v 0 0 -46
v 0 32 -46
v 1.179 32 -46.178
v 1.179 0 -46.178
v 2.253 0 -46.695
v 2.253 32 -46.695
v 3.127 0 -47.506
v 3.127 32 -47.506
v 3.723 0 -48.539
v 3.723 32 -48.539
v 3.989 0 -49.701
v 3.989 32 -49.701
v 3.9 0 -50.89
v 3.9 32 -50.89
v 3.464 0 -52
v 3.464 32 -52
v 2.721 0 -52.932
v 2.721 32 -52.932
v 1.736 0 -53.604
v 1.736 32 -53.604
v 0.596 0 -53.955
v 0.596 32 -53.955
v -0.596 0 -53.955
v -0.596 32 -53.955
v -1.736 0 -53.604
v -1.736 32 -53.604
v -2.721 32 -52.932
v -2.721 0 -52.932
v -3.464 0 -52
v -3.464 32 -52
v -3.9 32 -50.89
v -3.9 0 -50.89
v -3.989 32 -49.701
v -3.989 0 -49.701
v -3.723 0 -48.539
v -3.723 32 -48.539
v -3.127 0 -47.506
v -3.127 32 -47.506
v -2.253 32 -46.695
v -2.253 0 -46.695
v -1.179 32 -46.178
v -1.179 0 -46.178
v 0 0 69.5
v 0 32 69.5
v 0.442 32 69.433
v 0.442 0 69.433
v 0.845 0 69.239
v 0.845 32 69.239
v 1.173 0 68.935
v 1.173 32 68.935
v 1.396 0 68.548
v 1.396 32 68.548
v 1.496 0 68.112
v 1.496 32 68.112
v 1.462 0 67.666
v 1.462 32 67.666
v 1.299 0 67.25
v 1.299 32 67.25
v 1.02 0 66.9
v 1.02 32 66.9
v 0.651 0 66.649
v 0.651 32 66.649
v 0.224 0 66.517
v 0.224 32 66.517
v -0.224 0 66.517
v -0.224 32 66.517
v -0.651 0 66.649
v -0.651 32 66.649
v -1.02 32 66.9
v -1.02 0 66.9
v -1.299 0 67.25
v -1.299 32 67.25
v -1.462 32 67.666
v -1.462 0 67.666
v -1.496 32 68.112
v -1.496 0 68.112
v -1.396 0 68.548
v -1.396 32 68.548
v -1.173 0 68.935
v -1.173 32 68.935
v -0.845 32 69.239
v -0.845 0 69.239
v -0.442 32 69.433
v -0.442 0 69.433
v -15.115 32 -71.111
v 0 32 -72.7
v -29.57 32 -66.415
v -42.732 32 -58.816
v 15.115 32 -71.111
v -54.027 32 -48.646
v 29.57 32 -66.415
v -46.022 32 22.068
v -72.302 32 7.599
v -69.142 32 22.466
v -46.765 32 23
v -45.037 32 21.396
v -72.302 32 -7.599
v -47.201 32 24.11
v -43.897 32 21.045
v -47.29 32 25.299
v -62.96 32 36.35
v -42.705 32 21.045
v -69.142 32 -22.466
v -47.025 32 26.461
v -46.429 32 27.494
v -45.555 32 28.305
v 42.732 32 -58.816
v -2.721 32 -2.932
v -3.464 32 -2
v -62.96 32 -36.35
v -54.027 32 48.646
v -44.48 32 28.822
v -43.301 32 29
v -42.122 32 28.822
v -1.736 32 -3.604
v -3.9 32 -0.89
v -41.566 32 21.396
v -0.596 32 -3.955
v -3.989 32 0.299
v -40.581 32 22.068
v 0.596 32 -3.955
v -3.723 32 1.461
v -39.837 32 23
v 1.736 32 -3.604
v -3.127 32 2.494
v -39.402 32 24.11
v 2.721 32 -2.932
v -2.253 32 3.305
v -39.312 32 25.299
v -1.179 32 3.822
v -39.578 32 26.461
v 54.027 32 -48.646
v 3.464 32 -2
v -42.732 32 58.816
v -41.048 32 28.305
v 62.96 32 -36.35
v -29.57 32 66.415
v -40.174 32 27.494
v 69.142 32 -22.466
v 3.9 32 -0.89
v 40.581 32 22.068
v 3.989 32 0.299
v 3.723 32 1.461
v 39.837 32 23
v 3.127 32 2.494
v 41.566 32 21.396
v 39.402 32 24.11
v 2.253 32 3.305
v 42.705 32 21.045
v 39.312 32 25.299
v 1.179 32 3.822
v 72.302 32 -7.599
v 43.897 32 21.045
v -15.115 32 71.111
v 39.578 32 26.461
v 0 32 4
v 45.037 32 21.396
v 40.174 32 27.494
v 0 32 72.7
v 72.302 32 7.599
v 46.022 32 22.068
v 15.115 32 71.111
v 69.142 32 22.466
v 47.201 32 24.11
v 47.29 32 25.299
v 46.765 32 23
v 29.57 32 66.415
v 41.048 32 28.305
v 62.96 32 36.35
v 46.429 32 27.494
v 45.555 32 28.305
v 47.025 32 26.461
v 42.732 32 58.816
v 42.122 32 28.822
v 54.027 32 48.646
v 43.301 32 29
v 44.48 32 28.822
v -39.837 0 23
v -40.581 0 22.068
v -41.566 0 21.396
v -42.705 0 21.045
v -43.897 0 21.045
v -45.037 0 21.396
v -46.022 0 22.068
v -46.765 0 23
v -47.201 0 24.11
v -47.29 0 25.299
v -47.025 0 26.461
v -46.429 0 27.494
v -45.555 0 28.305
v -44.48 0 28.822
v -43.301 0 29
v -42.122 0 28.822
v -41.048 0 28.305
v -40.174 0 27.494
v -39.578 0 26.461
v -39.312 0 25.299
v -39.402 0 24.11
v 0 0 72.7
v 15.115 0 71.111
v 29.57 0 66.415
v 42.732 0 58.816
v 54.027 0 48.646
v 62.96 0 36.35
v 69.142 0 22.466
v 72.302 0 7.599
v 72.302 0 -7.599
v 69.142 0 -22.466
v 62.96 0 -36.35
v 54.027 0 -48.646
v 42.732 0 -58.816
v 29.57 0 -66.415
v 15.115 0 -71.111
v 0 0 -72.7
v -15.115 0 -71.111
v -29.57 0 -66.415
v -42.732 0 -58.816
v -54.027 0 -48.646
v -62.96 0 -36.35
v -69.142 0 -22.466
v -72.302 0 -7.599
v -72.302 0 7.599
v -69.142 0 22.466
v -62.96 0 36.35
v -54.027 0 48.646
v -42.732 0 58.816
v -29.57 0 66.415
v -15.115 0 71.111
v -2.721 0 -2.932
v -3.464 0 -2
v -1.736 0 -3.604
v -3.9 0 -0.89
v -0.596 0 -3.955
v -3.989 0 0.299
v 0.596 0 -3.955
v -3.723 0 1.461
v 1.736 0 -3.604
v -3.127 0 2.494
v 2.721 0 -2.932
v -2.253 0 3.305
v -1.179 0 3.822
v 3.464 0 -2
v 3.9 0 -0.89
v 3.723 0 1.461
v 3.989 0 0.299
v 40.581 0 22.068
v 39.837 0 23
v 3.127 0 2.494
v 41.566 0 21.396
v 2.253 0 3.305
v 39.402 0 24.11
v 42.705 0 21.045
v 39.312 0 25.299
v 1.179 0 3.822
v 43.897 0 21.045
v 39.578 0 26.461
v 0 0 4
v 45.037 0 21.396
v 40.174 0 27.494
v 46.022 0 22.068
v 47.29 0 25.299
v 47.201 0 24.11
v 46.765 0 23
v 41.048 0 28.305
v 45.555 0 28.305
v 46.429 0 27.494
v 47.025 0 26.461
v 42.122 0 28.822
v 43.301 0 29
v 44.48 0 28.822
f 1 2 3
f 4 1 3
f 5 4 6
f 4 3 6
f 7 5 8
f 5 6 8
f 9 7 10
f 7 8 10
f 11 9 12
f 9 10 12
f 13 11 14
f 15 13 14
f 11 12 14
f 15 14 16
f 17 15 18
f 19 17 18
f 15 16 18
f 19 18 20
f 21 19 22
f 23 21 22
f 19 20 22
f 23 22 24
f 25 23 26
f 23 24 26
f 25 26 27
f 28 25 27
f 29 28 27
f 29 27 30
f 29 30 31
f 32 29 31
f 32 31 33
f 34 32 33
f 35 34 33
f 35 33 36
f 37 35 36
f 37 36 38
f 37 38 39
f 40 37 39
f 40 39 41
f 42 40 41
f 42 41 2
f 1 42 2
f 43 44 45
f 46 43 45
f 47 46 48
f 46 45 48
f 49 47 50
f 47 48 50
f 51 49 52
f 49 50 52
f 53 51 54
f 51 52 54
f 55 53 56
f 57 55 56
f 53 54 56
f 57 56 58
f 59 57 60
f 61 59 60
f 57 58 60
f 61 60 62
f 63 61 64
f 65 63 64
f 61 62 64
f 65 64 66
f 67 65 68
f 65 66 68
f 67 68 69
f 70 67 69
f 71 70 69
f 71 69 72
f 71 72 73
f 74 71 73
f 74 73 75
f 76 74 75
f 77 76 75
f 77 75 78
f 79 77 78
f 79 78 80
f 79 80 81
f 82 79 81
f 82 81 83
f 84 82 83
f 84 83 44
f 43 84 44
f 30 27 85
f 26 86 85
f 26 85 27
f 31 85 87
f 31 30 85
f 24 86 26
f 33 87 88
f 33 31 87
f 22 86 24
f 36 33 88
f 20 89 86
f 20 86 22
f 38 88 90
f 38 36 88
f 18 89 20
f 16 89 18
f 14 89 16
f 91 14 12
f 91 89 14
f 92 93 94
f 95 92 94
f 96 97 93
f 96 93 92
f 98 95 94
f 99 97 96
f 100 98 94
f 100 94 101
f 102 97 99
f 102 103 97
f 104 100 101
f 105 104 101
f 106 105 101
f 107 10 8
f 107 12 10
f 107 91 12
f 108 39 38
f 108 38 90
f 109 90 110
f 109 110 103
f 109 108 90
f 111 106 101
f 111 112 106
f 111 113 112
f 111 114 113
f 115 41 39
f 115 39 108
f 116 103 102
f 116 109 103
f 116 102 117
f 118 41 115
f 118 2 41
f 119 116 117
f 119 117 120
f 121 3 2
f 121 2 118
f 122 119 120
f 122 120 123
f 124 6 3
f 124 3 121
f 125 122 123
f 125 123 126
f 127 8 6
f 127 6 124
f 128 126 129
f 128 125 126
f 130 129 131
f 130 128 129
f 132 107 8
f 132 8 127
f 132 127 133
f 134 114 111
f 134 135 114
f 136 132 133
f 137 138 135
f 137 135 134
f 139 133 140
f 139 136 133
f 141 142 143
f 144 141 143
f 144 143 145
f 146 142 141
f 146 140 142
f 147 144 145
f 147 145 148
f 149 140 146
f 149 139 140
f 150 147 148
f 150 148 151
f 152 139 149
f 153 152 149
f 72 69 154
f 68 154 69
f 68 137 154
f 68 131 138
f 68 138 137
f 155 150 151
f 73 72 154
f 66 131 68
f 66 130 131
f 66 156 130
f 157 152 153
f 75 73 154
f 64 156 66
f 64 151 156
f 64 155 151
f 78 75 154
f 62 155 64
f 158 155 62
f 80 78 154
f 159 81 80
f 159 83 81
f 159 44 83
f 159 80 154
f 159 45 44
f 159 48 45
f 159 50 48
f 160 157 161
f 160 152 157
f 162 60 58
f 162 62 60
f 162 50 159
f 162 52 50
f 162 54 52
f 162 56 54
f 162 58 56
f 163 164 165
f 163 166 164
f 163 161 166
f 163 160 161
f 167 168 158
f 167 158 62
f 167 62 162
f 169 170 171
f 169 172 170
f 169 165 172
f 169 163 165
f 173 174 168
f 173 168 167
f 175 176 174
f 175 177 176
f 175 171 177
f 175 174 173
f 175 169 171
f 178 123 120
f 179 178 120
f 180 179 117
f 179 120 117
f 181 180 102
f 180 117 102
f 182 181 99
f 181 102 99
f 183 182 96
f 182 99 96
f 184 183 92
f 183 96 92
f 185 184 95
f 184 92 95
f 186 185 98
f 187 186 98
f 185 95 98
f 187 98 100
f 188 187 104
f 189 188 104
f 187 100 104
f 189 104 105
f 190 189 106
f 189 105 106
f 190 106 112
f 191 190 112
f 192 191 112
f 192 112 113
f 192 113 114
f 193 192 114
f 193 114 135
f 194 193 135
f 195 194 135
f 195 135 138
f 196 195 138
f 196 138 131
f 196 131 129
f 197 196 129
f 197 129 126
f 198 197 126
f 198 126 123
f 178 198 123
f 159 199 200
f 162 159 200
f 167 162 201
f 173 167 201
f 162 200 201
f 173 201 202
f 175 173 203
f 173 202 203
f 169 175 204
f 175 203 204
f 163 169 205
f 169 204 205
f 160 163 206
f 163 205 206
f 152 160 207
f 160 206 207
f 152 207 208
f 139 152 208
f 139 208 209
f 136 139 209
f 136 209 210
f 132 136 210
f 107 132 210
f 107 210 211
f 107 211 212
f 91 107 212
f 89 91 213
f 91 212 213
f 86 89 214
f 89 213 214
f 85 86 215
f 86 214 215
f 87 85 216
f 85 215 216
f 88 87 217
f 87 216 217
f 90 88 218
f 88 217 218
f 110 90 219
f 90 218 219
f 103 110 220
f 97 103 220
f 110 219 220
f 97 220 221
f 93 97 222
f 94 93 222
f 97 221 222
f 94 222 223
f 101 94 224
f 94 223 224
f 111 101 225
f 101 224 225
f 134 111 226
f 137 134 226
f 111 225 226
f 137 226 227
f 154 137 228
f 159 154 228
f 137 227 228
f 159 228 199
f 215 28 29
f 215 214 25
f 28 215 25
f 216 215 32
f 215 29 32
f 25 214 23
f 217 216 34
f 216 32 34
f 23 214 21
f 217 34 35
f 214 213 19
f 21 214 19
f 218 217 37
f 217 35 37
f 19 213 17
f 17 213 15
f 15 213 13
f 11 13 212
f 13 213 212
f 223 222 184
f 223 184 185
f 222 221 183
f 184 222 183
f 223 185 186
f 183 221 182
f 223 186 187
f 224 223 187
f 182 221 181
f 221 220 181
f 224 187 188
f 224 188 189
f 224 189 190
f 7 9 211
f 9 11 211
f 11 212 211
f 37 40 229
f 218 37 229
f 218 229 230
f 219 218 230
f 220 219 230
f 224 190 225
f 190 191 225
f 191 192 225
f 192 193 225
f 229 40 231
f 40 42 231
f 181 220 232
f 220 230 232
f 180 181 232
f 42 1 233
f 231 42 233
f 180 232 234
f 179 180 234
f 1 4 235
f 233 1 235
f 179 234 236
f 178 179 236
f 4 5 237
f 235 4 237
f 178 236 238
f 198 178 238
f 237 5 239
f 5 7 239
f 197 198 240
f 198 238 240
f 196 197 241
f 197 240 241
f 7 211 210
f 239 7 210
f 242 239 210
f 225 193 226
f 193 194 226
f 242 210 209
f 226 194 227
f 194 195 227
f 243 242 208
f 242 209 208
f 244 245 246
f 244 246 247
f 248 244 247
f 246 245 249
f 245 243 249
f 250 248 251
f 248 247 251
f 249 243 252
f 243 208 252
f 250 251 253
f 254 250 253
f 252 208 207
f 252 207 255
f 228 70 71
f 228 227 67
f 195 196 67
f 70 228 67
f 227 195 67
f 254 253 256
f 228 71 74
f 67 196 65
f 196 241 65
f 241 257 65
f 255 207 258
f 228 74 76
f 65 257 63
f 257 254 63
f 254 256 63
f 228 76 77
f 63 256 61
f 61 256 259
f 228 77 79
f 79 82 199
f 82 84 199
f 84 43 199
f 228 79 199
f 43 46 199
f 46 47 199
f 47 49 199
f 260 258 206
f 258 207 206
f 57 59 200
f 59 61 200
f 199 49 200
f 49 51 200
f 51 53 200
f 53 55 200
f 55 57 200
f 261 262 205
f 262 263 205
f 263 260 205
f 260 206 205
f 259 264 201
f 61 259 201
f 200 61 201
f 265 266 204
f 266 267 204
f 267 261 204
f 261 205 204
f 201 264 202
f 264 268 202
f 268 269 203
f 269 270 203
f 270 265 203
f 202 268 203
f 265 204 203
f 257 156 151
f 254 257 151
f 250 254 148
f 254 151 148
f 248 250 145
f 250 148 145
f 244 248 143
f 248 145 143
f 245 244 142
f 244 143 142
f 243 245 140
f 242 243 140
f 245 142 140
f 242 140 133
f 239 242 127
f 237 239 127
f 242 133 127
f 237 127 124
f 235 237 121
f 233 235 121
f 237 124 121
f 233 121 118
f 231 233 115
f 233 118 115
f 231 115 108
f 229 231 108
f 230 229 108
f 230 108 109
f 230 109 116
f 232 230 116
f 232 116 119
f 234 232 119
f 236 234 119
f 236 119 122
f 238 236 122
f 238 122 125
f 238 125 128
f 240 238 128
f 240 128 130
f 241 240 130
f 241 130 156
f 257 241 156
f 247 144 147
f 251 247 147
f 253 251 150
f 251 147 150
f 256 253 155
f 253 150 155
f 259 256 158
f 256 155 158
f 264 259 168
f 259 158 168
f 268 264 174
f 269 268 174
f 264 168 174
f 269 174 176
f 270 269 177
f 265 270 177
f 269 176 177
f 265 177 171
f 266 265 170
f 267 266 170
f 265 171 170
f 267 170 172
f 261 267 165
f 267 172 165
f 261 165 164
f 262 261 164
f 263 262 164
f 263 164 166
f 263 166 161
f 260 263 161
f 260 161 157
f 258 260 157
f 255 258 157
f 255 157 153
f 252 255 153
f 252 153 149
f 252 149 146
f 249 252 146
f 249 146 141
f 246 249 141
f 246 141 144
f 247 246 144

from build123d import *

# Parameters (mm, degrees)
SKETCH1_R           = 72.7
BOSS_EXTRUDE1_DEPTH = 32
SKETCH2_R           = 4
CUT_EXTRUDE1_DEPTH  = 108.678131485
CIRPATTERN1_COUNT   = 3
SKETCH3_R           = 1.5
CUT_EXTRUDE2_DEPTH  = 108.678131485
SKETCH4_R           = 4
CUT_EXTRUDE3_DEPTH  = 108.678131485


with BuildPart() as part:
    # Sketch1 → Boss-Extrude1 (new body)
    with BuildSketch(Plane(origin=(0, 0, 0), x_dir=(1, 0, 0), z_dir=(0, 1, 0))):
        Circle(SKETCH1_R)
    extrude(amount=BOSS_EXTRUDE1_DEPTH)

    # Sketch2 → Cut-Extrude1 (cut, through all)
    with BuildSketch(Plane(origin=(0, 32, 0), x_dir=(1, 0, 0), z_dir=(0, 1, 0))):
        with Locations((0, 50)):
            Circle(SKETCH2_R)
    cut_extrude1 = extrude(amount=-CUT_EXTRUDE1_DEPTH, mode=Mode.SUBTRACT)

    # CirPattern1: Cut-Extrude1 ×3 about axis
    cirpattern1_axis = Axis((0, 33.6, 0), (0, -1, 0))
    for i in range(1, CIRPATTERN1_COUNT):
        add(cut_extrude1.rotate(cirpattern1_axis, i * 360 / CIRPATTERN1_COUNT), mode=Mode.SUBTRACT)

    # Sketch3 → Cut-Extrude2 (cut, through all)
    with BuildSketch(Plane(origin=(0, 32, 0), x_dir=(1, 0, 0), z_dir=(0, 1, 0))):
        with Locations((0, -68)):
            Circle(SKETCH3_R)
    extrude(amount=-CUT_EXTRUDE2_DEPTH, mode=Mode.SUBTRACT)

    # Sketch4 → Cut-Extrude3 (cut, through all)
    with BuildSketch(Plane(origin=(0, 32, 0), x_dir=(1, 0, 0), z_dir=(0, 1, 0))):
        Circle(SKETCH4_R)
    extrude(amount=-CUT_EXTRUDE3_DEPTH, mode=Mode.SUBTRACT)


solid = part.part
